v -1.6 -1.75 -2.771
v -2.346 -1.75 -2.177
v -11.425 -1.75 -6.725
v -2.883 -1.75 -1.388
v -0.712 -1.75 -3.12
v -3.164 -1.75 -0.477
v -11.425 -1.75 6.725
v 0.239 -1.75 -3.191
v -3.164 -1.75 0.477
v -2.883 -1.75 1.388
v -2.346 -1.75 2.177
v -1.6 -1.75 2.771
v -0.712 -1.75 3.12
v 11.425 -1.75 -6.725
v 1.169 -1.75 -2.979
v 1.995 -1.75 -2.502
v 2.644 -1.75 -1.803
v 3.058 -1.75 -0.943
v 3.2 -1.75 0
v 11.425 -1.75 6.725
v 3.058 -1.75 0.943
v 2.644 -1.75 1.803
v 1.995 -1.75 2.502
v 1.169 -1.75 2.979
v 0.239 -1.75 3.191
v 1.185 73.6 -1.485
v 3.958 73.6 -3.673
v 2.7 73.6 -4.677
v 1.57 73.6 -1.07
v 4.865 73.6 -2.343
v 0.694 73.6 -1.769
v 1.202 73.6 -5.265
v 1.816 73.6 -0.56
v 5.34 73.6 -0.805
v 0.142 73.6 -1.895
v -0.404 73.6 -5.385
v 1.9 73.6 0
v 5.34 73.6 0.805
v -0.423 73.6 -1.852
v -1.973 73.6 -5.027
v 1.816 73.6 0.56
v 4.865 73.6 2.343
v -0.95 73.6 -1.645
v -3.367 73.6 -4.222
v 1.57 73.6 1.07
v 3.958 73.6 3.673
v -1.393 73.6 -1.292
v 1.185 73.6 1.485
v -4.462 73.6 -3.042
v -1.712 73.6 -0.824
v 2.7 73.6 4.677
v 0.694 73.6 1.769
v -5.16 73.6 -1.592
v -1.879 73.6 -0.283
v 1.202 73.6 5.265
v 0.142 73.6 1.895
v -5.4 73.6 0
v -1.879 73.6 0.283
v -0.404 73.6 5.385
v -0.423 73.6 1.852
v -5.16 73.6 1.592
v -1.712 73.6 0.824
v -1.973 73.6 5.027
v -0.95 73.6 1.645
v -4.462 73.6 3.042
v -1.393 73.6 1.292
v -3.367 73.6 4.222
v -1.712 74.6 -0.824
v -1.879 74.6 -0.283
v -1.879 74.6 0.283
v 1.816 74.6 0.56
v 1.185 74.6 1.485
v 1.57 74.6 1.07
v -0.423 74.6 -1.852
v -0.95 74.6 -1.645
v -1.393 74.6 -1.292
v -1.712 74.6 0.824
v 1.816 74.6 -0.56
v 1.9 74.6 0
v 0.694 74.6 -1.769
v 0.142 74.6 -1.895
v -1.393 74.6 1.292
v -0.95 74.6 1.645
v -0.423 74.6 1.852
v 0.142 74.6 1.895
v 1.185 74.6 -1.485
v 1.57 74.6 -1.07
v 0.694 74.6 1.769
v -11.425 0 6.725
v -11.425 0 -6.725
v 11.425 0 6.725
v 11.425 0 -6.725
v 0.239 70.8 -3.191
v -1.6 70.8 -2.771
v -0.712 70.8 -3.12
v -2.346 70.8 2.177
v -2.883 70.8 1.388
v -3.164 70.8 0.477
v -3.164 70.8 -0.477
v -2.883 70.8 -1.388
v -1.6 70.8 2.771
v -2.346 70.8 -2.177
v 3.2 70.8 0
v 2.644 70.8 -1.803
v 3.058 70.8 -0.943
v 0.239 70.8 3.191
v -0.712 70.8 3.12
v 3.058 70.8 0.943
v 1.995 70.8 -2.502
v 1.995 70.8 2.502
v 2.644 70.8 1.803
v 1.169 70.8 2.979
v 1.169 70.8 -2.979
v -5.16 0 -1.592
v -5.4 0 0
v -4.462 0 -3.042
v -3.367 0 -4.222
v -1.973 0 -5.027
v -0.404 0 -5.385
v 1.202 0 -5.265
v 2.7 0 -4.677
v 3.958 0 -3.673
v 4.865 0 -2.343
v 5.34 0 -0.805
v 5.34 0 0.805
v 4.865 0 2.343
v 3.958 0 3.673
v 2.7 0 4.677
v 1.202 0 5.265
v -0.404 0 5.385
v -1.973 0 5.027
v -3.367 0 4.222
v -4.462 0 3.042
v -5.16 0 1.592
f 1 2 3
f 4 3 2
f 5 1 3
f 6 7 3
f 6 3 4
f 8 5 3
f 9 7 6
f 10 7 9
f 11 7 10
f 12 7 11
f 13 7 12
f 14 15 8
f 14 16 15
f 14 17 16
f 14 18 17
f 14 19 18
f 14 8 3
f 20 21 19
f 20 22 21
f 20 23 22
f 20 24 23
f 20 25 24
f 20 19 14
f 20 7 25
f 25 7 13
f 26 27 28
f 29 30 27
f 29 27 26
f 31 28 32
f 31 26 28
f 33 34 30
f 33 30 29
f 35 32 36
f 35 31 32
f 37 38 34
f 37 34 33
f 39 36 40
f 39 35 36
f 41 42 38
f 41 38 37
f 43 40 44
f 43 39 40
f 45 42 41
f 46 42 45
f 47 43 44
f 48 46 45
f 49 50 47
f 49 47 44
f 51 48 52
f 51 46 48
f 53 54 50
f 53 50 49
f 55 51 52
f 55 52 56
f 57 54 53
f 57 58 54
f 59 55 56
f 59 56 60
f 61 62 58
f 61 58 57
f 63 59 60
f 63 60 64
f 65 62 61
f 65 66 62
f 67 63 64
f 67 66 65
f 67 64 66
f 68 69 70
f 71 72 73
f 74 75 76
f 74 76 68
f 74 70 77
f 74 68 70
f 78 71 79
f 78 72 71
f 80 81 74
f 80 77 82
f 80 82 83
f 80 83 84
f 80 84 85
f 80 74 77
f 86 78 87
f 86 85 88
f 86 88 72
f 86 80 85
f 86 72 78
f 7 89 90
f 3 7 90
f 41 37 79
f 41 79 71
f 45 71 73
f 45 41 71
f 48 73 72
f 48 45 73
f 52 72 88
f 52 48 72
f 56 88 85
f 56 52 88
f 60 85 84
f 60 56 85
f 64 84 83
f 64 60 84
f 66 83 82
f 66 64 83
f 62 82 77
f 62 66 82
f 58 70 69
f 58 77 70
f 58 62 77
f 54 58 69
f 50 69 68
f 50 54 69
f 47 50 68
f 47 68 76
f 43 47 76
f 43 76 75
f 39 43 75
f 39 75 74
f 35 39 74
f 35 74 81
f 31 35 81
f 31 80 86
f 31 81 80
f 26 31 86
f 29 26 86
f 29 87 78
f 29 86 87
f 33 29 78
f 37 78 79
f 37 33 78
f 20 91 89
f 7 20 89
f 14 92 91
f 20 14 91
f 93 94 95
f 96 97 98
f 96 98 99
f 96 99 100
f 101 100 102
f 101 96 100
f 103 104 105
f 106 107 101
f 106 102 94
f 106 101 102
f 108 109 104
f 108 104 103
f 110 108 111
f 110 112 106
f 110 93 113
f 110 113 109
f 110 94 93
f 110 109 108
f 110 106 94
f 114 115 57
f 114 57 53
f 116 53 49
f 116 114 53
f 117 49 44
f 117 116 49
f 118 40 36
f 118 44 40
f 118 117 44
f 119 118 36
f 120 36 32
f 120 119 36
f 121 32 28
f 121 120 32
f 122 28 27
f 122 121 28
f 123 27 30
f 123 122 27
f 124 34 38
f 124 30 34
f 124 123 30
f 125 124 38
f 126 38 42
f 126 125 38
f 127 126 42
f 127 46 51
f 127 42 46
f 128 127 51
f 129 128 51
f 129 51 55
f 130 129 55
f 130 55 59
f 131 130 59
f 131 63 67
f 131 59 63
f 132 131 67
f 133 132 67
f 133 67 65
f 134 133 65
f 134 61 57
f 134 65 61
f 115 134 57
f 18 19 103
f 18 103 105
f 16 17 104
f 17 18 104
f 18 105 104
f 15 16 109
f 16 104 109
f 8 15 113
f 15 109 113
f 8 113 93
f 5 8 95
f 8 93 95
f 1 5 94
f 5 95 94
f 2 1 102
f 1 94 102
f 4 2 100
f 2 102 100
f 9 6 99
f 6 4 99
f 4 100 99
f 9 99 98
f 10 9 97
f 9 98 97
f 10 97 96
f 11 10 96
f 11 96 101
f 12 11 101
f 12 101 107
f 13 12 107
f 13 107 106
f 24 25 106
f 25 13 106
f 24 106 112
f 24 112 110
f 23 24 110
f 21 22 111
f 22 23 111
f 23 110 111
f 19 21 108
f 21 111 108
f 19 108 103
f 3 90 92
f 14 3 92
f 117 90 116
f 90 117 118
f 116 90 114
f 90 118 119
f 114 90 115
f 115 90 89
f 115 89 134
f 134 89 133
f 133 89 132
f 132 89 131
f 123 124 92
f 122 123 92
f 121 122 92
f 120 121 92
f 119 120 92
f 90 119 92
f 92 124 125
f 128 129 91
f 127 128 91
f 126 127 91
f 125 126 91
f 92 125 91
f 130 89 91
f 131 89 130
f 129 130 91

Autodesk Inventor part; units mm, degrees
ref_plane "YZ Plane" through (0, 0, 0) normal (1, 0, 0) x (0, 1, 0)
ref_plane "XZ Plane" through (0, 0, 0) normal (0, 1, 0) x (-1, 0, 0)
ref_plane "XY Plane" through (0, 0, 0) normal (0, 0, 1) x (1, 0, 0)
sketch "Sketch1" plane through (0, 0, 0) normal (0, 1, 0) x (-1, 0, 0)
  circle A0 centre (0, 0) radius 5.4
  dimension "d0" = 10.8
extrude "Extrusion1" add sketch "Sketch1" along normal blind 73.6
sketch "Sketch2" plane through (0, 0, 0) normal (0, -1, 0) x (1, 0, 0)
  circle A0 centre (0, 0) radius 3.2
  dimension "d3" = 6.4
extrude "Extrusion2" cut sketch "Sketch2" against normal blind 70.8
sketch "Sketch3" plane through (0, 73.6, 0) normal (0, 1, 0) x (1, 0, 0)
  circle A0 centre (0, 0) radius 1.9
extrude "Extrusion3" add sketch "Sketch3" along normal blind 1
sketch "Sketch4" plane through (0, 0, 0) normal (0, -1, 0) x (1, 0, 0)
  line L0 (0, 0) -> (0, 6.725)
  line L1 (0, 6.725) -> (0, -6.725)
  line L2 (0, 6.725) -> (11.425, 6.725)
  line L3 (11.425, 6.725) -> (-11.425, 6.725)
  line L4 (-11.425, 6.725) -> (-11.425, -2.725)
  line L5 (11.425, -2.725) -> (11.425, 6.725)
  circle A0 centre (0, 0) radius 3.2 projected
  line L6 (-11.425, 6.725) -> (-11.425, -6.725)
  line L7 (-11.425, -6.725) -> (11.425, -6.725)
  line L8 (11.425, -6.725) -> (11.425, 6.725)
  dimension "d8" = 6.725
  dimension "d9" = 13.45
  dimension "d10" = 11.425
  dimension "d11" = 22.85
  dimension "d17" = 13.45
extrude "Extrusion4" add sketch "Sketch4" along normal blind 1.75 contours A0 L1 L7 L6 L4 L3 L0 | L0 L2 L5 L8 L7 L1 A0
properties part number "SyringeBody"
